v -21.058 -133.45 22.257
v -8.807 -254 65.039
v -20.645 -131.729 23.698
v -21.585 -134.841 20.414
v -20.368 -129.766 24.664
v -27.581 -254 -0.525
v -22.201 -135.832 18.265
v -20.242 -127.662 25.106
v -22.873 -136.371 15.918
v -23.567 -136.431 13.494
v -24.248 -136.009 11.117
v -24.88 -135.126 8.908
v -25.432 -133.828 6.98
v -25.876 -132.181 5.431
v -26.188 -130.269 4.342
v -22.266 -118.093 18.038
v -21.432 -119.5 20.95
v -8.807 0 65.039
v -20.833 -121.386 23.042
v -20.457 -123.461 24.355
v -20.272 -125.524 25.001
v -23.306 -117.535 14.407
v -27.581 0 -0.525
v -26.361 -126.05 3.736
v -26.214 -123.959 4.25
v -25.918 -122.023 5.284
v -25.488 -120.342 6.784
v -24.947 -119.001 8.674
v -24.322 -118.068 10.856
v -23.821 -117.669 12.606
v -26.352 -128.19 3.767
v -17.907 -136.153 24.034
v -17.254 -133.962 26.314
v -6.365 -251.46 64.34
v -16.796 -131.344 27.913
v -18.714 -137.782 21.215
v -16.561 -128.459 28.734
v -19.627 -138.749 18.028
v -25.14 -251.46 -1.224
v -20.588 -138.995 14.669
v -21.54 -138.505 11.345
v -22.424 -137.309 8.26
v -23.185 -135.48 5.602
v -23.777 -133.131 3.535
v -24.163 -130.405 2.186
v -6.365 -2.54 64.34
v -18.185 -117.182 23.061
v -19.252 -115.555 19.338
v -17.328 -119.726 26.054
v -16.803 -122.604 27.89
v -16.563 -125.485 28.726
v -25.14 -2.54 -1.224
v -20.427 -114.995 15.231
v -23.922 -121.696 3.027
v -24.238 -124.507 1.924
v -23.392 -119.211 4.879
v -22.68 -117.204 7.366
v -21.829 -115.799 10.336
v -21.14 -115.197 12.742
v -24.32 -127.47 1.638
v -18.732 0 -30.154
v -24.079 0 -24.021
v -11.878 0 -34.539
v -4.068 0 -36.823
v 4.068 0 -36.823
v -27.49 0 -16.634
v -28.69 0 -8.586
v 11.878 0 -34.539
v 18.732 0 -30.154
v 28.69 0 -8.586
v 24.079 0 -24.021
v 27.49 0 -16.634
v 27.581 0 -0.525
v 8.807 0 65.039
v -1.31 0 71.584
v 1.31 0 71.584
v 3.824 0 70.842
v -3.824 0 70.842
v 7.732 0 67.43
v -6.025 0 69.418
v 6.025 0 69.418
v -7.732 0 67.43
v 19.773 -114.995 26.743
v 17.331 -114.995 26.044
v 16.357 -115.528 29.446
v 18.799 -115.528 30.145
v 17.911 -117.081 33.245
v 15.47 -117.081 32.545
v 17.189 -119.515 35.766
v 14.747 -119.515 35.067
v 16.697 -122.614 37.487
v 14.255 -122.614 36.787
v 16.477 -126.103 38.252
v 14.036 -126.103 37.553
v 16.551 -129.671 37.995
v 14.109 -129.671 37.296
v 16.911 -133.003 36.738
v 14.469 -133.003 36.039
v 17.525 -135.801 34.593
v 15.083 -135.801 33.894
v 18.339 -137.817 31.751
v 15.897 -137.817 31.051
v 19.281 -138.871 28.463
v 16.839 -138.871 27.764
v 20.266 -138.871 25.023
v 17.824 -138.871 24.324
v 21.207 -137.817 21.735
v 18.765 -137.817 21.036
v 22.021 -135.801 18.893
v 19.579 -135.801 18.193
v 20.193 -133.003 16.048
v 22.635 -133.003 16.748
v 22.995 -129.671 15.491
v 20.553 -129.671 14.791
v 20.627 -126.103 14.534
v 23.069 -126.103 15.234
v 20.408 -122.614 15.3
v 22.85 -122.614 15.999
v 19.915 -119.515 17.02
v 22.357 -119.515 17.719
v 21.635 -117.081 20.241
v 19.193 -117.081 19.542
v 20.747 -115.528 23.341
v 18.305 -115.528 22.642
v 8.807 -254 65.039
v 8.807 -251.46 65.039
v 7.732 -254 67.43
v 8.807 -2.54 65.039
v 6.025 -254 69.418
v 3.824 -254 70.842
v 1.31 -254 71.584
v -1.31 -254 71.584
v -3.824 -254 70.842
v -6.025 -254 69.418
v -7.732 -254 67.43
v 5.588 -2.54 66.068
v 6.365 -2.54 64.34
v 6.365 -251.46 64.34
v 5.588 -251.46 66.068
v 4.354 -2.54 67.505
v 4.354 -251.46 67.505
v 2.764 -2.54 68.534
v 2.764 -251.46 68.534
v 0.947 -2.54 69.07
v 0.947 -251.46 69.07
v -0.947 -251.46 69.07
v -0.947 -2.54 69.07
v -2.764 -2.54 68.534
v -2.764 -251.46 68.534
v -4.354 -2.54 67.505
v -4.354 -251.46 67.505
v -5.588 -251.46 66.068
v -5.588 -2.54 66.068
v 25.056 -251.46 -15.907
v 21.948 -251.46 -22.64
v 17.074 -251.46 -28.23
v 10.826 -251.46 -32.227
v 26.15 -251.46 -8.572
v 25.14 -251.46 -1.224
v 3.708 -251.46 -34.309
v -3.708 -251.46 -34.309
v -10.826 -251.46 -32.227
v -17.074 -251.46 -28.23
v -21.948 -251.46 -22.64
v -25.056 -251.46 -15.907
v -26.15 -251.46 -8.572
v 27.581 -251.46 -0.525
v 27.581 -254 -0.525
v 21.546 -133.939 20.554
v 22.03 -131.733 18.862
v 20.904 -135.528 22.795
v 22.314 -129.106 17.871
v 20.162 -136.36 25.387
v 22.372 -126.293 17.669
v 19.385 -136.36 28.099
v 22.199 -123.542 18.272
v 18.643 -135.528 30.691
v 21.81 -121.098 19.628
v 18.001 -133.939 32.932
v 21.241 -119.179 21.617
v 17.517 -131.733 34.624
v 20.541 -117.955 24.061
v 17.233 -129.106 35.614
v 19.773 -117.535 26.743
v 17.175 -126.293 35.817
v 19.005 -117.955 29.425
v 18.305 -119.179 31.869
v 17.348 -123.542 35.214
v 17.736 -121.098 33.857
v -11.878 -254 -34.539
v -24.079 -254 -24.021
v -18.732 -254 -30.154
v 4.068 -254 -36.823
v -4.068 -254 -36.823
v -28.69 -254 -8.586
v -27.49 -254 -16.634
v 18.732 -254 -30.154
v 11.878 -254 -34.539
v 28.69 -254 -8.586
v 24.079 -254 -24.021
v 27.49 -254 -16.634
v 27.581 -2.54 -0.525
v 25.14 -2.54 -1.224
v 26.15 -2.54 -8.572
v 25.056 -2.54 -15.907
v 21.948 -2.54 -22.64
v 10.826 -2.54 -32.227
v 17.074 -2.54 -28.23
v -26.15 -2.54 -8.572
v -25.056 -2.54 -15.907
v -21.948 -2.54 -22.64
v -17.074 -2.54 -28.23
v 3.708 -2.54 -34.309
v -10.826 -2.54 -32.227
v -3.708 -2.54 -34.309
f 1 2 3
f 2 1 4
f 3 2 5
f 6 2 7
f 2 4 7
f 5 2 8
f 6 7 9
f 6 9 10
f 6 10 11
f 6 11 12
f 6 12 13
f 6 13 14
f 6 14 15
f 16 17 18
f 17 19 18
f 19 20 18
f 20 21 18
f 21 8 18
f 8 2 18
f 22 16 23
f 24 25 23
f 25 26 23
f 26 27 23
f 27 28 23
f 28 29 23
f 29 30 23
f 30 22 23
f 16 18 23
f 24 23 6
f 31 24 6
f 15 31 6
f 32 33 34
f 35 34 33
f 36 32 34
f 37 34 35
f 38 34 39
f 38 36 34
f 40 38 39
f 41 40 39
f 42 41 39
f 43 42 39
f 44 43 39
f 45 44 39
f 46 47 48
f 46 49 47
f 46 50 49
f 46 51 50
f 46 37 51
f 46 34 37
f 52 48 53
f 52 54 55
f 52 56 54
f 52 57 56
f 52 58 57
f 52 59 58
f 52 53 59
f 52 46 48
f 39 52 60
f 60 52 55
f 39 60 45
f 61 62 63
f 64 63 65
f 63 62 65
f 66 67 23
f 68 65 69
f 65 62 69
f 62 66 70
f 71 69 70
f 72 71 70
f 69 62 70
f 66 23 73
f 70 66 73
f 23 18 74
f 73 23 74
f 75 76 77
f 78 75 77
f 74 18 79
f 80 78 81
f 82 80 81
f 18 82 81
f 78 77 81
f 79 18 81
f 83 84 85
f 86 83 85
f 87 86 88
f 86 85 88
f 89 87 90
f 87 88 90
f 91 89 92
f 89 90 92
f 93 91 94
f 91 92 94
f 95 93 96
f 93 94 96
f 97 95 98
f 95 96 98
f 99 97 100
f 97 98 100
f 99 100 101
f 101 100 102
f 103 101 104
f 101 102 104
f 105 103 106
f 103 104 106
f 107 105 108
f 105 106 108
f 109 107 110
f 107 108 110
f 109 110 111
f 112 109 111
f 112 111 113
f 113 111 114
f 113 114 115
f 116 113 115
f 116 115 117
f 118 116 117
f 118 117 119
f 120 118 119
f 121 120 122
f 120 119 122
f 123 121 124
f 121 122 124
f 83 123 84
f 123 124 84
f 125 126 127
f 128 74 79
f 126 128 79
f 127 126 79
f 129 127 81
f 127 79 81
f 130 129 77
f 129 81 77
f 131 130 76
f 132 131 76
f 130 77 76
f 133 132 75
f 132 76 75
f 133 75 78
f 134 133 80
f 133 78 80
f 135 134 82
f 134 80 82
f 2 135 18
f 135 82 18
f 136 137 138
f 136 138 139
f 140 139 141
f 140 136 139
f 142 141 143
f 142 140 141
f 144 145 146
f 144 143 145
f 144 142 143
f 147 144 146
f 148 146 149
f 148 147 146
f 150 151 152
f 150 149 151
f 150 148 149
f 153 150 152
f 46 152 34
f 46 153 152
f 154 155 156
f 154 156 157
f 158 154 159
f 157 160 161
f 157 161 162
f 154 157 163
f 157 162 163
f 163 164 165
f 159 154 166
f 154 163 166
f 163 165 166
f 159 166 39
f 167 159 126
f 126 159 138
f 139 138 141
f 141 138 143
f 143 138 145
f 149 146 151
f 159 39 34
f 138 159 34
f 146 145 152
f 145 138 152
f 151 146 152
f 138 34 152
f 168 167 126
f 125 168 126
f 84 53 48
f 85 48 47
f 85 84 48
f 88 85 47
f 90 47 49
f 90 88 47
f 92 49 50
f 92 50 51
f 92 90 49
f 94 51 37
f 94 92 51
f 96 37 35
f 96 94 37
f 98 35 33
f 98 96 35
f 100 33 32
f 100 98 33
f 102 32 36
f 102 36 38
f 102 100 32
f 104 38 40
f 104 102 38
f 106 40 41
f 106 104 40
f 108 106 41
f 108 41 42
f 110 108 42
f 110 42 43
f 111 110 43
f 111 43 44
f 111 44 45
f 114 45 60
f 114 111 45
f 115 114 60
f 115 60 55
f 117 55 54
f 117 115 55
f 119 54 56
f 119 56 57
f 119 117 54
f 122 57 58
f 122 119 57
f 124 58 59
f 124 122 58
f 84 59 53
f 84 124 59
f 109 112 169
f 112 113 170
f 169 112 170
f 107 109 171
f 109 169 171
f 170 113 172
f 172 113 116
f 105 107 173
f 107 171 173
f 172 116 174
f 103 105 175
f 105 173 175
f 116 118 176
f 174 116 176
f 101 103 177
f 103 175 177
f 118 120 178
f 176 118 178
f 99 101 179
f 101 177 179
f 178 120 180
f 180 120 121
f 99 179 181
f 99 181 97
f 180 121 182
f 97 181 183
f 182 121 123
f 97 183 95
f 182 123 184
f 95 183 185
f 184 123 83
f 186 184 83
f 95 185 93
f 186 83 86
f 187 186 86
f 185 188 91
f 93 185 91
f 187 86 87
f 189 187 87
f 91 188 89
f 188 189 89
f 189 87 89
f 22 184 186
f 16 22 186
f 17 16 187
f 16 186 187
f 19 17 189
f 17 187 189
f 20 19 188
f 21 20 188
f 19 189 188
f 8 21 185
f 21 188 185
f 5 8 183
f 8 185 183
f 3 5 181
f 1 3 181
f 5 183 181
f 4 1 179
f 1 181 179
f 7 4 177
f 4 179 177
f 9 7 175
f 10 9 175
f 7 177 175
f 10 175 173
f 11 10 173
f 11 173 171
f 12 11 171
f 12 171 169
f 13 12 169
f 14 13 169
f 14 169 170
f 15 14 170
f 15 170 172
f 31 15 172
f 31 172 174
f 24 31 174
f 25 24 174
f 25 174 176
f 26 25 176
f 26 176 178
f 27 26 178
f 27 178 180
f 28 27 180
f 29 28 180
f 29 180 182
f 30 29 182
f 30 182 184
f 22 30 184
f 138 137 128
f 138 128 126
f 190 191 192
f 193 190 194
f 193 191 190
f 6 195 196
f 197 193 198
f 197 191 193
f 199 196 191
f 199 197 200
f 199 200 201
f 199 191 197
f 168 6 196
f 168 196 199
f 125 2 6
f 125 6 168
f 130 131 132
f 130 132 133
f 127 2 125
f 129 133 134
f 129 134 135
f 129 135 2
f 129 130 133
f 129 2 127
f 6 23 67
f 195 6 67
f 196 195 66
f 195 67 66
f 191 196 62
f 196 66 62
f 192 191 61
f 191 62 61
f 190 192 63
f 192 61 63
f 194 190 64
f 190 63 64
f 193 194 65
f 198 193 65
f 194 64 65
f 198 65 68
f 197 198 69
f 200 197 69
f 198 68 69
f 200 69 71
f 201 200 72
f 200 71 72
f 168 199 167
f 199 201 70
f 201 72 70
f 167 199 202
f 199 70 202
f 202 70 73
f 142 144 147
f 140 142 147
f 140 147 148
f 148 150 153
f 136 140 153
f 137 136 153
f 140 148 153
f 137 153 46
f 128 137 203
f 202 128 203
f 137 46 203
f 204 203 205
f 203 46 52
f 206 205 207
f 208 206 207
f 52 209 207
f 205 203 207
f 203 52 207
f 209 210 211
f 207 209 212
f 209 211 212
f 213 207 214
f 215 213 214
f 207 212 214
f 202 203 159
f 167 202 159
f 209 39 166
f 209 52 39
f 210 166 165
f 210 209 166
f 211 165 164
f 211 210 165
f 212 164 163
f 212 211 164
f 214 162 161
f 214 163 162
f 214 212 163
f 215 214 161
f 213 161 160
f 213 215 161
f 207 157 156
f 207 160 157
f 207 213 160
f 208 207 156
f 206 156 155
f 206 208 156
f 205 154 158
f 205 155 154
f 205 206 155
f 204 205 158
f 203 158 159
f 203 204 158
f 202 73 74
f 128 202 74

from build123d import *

# Parameters (mm, degrees)
F1_DEPTH = 254
F2_R     = 9.4654470454
F3_DEPTH = 64.1706123384
F4_T     = -2.54


# Not quite as in the source:
# - a shell that OpenCascade refuses in one call is made with other operations: the cavity is built on its own and cut out


with BuildPart() as f1:
    # F0 (on Front) → F1 (new body)
    with BuildSketch(Plane.XZ):
        with BuildLine():
            Line((-8.8068979187, 65.0390158129), (-27.5814907687, -0.52515852))
            ThreePointArc((-27.5814907687, -0.52515852), (0, -37.1132800896), (27.5814907687, -0.52515852))
            Line((27.5814907687, -0.52515852), (8.8068979187, 65.0390158129))
            ThreePointArc((8.8068979187, 65.0390158129), (0, 71.6779839596), (-8.8068979187, 65.0390158129))
        make_face()
    extrude(amount=F1_DEPTH)

    # F2 (on face) → F3 (cut, through all)
    with BuildSketch(Plane(origin=(25.3522532018, 0, 7.2597304326), x_dir=(0, 1, 0), z_dir=(0.961361214, 0, 0.2752900583))):
        with Locations((-127, 20.2662516385)):
            Circle(F2_R)
    extrude(amount=-F3_DEPTH, mode=Mode.SUBTRACT)

    # F4: a shell. OpenCascade refuses it in one call, so the cavity is built on its own and cut out:
    # the body offset inwards by the wall thickness, plus a prism from it out through each open face.
    f4_core = offset(f1.part, amount=F4_T, mode=Mode.PRIVATE)
    f4_exits = [f4_core.faces().sort_by_distance(p)[0] for p in [
        (24.429127, -127, 1.256817),
    ]]
    add(f4_core, mode=Mode.SUBTRACT)
    extrude(f4_exits, amount=-F4_T, mode=Mode.SUBTRACT)


solid = f1.part
